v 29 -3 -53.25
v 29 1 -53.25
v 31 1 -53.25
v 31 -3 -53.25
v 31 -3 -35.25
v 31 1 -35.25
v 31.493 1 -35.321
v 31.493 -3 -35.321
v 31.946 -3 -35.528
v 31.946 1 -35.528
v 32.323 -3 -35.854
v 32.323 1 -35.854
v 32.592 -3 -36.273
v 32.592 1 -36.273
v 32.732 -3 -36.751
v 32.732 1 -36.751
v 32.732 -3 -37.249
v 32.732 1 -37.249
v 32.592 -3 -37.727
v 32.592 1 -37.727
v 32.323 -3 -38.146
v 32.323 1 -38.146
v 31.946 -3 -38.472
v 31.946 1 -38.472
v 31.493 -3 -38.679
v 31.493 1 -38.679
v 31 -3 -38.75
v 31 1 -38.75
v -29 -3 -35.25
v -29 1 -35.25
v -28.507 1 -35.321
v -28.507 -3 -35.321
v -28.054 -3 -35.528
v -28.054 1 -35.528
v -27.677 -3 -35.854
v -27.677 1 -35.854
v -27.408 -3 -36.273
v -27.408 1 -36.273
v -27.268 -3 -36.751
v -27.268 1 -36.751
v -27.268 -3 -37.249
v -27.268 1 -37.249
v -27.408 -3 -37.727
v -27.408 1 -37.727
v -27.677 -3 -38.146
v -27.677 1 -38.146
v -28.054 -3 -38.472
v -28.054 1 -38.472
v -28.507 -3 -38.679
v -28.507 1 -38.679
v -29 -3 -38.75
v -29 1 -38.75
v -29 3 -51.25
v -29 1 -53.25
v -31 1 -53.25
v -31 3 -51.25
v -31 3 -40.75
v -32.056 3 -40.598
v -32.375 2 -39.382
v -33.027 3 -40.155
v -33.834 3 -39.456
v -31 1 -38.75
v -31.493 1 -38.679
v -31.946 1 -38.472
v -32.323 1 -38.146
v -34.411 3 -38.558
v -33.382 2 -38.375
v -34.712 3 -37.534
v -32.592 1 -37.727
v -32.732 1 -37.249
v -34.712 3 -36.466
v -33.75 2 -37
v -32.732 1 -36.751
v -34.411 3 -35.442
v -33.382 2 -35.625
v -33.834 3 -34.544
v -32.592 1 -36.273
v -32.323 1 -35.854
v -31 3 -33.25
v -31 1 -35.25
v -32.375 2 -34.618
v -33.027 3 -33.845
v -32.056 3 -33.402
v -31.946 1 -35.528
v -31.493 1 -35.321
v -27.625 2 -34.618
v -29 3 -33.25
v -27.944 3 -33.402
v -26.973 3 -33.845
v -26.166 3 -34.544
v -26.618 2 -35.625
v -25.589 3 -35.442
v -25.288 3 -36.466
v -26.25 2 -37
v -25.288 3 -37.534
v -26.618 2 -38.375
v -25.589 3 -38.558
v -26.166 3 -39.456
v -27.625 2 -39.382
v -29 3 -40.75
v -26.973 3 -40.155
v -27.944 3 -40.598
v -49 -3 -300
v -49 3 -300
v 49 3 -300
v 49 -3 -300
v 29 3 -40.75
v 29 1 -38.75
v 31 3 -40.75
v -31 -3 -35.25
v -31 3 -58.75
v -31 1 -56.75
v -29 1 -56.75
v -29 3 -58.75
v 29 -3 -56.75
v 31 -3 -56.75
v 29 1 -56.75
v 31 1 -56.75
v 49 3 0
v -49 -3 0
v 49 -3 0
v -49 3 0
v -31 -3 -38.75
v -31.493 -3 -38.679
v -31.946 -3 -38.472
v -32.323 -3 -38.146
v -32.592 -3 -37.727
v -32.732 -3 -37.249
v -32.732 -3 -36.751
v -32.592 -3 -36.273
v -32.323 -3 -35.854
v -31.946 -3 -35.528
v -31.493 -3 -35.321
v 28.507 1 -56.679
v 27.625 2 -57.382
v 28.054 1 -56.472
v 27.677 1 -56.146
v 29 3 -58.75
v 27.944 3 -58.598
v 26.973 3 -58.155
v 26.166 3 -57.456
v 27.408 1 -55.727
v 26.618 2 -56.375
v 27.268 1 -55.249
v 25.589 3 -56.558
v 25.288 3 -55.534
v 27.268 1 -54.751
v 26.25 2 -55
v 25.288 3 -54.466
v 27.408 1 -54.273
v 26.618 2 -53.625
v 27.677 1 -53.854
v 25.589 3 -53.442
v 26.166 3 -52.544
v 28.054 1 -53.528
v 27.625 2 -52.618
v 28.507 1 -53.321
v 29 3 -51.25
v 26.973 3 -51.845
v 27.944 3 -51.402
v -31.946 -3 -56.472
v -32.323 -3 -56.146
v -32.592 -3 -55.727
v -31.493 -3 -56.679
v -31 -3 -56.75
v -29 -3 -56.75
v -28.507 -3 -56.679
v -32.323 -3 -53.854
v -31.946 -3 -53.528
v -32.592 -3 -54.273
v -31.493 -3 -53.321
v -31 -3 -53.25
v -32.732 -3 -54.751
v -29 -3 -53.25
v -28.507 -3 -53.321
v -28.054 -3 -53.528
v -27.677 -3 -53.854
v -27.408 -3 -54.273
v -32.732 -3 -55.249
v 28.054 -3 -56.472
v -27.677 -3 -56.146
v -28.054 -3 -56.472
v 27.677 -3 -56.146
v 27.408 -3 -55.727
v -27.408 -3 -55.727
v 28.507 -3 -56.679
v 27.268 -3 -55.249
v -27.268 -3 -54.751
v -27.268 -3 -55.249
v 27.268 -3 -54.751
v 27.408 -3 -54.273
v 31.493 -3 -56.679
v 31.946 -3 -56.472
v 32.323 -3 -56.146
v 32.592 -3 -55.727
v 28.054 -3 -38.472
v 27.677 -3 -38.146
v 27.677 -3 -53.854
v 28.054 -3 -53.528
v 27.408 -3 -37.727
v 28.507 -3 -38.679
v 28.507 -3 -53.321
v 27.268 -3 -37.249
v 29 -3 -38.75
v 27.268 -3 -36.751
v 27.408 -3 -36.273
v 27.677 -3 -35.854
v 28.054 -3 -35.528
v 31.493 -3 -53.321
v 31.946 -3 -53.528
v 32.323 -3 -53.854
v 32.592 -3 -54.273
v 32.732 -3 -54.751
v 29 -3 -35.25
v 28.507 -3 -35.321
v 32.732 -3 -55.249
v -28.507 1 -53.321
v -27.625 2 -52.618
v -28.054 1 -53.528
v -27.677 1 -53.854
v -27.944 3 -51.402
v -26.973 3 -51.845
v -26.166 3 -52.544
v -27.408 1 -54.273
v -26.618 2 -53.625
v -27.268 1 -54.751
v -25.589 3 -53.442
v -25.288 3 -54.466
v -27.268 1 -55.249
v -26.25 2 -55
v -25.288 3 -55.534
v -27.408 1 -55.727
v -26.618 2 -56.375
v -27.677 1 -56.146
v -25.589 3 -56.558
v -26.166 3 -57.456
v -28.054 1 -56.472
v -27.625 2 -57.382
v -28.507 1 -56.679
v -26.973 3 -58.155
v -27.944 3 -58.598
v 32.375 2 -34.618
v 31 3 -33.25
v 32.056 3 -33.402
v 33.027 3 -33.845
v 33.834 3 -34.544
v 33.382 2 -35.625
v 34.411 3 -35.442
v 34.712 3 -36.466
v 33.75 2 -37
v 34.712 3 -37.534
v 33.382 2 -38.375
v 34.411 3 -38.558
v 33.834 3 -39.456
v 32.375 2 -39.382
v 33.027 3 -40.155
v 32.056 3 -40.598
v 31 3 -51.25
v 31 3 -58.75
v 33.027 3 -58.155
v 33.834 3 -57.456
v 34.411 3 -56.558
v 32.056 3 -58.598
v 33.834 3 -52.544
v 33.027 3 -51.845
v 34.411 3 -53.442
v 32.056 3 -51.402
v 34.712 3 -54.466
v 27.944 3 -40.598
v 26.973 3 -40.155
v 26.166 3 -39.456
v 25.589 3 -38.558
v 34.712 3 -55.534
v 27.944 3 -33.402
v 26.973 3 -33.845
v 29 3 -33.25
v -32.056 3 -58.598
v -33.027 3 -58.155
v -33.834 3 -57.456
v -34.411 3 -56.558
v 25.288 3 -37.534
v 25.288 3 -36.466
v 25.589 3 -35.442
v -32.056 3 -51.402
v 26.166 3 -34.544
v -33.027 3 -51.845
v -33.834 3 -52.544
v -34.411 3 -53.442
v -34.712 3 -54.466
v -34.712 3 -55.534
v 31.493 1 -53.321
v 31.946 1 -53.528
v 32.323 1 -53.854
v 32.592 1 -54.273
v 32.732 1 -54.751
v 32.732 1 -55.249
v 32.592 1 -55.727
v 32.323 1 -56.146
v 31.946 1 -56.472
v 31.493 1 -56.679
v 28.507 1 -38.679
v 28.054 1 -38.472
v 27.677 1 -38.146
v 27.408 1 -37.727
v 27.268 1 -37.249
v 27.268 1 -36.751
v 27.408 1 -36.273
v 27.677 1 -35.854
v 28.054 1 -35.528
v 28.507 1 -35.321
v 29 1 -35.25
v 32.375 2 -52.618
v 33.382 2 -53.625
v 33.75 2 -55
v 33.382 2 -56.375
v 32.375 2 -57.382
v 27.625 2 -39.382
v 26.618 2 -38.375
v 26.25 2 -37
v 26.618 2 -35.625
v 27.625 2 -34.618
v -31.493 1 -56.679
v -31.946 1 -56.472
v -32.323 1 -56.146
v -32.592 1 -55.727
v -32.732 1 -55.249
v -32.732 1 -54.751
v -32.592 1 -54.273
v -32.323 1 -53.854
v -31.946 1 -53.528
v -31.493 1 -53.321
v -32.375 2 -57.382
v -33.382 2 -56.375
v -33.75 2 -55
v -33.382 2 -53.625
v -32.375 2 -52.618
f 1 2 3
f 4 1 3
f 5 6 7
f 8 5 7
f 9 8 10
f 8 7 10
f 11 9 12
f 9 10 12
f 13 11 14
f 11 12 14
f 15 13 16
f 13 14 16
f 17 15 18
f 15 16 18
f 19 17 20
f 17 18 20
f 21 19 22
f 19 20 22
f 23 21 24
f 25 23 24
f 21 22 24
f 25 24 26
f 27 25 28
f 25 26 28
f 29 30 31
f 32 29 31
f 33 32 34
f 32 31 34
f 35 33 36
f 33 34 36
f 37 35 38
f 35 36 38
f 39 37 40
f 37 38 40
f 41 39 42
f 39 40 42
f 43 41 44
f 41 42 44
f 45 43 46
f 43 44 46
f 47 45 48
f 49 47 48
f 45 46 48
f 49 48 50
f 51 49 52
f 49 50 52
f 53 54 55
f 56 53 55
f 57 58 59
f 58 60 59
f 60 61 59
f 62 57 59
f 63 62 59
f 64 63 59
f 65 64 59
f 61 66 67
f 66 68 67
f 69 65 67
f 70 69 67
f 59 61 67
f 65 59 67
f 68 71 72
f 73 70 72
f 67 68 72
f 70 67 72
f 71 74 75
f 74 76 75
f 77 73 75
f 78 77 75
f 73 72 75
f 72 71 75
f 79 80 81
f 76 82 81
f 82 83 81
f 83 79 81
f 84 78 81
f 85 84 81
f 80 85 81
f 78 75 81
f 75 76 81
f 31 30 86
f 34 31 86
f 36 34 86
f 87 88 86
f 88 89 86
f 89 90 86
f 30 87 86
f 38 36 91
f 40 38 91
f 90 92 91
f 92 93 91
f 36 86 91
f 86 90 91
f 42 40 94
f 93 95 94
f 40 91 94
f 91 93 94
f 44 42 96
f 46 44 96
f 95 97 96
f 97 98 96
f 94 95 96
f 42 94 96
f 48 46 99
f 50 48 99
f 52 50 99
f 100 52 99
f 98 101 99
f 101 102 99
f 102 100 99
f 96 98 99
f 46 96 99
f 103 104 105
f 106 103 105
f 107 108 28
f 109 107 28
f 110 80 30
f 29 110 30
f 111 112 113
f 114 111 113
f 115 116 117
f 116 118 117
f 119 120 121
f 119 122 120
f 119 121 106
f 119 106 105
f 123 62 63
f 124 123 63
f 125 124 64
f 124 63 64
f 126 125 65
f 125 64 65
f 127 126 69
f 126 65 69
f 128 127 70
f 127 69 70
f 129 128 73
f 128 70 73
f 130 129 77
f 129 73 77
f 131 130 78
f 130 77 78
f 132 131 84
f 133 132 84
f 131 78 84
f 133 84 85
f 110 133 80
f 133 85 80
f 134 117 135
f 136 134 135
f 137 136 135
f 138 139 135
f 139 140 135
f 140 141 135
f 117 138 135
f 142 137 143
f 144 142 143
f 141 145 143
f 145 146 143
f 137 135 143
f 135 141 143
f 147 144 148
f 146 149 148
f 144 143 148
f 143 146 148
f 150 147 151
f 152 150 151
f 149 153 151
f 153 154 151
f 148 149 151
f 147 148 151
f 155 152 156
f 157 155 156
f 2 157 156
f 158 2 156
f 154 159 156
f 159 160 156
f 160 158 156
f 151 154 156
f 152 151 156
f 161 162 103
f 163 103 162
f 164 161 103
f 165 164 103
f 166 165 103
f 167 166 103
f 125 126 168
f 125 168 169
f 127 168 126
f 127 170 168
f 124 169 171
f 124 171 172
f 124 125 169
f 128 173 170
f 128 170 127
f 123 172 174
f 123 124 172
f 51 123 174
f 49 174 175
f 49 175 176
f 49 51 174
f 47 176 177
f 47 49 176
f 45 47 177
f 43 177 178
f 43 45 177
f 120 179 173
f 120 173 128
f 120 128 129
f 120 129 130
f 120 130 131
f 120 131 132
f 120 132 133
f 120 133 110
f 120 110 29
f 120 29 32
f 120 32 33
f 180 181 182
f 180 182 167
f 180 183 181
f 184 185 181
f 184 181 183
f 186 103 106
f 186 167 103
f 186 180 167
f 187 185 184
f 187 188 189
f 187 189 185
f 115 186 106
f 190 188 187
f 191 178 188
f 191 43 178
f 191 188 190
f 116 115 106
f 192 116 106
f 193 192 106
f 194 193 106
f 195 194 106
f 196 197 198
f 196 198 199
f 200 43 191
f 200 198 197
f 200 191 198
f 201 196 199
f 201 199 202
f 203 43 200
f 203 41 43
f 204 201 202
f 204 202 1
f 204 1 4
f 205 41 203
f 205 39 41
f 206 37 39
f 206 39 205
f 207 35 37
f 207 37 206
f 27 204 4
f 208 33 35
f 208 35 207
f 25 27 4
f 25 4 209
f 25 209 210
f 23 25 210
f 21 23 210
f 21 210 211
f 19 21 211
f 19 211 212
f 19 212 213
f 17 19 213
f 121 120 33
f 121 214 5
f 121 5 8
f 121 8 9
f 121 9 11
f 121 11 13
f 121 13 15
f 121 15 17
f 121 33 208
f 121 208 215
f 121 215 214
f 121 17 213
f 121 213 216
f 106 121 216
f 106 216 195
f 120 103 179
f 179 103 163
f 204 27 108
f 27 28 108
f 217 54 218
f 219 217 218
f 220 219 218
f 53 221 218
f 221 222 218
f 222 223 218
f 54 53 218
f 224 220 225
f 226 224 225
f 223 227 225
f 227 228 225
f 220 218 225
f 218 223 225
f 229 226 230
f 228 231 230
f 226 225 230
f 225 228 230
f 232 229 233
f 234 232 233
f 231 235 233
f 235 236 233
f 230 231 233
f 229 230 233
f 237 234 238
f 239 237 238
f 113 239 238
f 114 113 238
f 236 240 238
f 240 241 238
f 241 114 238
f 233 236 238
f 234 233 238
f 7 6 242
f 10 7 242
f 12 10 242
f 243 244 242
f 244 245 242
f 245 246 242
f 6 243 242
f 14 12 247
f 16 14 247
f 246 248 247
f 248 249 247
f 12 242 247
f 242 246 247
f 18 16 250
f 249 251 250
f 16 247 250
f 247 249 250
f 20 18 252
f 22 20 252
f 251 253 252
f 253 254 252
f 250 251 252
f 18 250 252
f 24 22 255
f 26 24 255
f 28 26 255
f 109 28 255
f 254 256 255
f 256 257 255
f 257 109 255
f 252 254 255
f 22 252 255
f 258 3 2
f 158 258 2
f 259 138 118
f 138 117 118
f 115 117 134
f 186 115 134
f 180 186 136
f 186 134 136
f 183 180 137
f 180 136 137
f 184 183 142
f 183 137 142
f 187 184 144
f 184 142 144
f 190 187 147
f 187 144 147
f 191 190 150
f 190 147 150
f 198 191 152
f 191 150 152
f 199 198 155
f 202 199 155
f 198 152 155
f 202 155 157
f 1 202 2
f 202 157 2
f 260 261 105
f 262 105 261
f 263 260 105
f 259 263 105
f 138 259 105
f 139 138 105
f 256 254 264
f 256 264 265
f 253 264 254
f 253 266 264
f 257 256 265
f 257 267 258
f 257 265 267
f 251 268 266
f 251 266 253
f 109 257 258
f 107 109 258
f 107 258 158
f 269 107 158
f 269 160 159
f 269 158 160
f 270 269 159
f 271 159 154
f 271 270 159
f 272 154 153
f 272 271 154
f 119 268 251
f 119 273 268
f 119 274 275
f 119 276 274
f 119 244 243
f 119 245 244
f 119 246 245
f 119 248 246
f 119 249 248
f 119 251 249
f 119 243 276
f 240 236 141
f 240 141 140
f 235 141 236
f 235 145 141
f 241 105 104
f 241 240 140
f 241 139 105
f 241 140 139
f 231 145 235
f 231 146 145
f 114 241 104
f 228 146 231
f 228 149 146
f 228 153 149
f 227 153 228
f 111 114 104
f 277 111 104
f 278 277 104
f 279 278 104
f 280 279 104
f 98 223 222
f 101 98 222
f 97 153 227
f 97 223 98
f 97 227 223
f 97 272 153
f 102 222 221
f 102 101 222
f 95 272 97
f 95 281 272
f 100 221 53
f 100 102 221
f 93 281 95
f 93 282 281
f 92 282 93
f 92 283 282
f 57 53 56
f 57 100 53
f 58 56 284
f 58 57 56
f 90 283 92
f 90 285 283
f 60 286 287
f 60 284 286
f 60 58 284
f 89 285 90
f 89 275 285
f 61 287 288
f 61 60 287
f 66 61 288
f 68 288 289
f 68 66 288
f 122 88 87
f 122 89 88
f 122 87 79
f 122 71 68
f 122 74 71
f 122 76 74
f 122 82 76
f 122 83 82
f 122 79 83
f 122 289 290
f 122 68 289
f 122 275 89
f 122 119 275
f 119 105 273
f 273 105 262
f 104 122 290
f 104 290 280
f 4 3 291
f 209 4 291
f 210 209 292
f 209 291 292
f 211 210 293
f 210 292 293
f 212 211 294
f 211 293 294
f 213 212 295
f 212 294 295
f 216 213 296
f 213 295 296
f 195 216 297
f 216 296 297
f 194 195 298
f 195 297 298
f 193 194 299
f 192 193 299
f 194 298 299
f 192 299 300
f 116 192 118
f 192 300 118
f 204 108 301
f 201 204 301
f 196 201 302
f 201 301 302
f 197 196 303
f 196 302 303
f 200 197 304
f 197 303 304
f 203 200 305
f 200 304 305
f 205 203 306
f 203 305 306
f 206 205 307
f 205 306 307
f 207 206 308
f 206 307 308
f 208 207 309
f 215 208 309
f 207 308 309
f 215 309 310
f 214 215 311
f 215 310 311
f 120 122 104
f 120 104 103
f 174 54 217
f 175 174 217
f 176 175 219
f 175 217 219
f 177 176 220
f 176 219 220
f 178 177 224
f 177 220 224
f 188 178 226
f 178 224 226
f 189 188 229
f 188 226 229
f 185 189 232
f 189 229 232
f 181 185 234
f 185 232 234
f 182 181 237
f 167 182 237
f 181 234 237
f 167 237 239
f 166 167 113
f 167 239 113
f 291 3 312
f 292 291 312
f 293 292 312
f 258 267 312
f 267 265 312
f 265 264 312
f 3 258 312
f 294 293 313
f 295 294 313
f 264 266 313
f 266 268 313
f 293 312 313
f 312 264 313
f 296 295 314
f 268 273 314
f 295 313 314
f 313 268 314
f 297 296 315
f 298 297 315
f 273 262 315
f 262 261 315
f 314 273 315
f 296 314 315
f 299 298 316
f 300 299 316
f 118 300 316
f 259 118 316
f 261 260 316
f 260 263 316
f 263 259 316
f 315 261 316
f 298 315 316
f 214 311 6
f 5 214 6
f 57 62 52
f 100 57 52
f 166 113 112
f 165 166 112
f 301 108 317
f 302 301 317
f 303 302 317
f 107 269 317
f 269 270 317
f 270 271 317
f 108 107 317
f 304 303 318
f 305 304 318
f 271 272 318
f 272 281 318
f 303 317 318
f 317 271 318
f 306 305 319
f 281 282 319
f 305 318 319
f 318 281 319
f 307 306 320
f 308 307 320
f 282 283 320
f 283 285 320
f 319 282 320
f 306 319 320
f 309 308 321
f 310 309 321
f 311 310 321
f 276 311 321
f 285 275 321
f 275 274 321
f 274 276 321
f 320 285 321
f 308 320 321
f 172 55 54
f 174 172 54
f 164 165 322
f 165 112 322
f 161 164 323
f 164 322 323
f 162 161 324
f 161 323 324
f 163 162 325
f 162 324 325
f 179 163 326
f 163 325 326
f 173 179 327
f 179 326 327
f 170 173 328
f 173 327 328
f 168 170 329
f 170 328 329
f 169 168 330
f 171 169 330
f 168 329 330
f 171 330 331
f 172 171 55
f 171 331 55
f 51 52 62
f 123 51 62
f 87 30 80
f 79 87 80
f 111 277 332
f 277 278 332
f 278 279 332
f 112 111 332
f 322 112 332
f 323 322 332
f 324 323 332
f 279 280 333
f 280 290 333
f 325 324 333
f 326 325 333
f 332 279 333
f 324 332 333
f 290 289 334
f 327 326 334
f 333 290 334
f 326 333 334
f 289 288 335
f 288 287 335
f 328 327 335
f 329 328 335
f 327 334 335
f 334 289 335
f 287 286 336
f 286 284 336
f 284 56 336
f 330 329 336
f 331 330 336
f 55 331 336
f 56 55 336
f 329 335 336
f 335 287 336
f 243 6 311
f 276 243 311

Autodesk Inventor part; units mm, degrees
ref_plane "YZ Plane" through (0, 0, 0) normal (1, 0, 0) x (0, 1, 0)
ref_plane "XZ Plane" through (0, 0, 0) normal (0, 1, 0) x (-1, 0, 0)
ref_plane "XY Plane" through (0, 0, 0) normal (0, 0, 1) x (1, 0, 0)
sketch "Skizze1" plane through (0, 0, 0) normal (0, 0, 1) x (1, 0, 0)
  line L0 (-68.6, 0) -> (68.6, 0) projected
  line L1 (0, -4.2) -> (0, 4.2) projected
  line L2 (-49, -3) -> (49, -3)
  line L3 (49, -3) -> (49, 3)
  line L4 (49, 3) -> (-49, 3)
  line L5 (-49, 3) -> (-49, -3)
  line L6 (-49, -3) -> (49, 3) construction
  line L7 (49, -3) -> (-49, 3) construction
  point P0 (0, 0)
  dimension "d0" = 98
  dimension "d1" = 6
extrude "Extrusion1" add sketch "Skizze1" against normal blind 300
sketch "Skizze2" plane through (-49, 3, 0) normal (0, 1, 0) x (1, 0, 0)
  line L0 (-19.6, 0) -> (117.6, 0) projected
  line L1 (49, 360) -> (49, -60) projected
  line L2 (98, 0) -> (0, 0) projected
  line L3 (98, 0) -> (98, 300) projected
  line L4 (0, 300) -> (98, 300) projected
  line L5 (0, 0) -> (0, 300) projected
  line L6 (18, 37) -> (20, 37) construction
  line L7 (18, 35.25) -> (20, 35.25)
  line L8 (20, 38.75) -> (18, 38.75)
  arc A0 (18, 38.75) -> (18, 35.25) centre (18, 37) ccw
  arc A1 (20, 35.25) -> (20, 38.75) centre (20, 37) ccw
  arc A2 (20, 53.25) -> (20, 56.75) centre (20, 55) ccw
  line L9 (18, 53.25) -> (20, 53.25)
  arc A3 (18, 56.75) -> (18, 53.25) centre (18, 55) ccw
  line L10 (20, 56.75) -> (18, 56.75)
  arc A4 (80, 35.25) -> (80, 38.75) centre (80, 37) ccw
  line L11 (78, 35.25) -> (80, 35.25)
  arc A5 (78, 38.75) -> (78, 35.25) centre (78, 37) ccw
  line L12 (80, 38.75) -> (78, 38.75)
  arc A6 (80, 53.25) -> (80, 56.75) centre (80, 55) ccw
  line L13 (78, 53.25) -> (80, 53.25)
  arc A7 (78, 56.75) -> (78, 53.25) centre (78, 55) ccw
  line L14 (80, 56.75) -> (78, 56.75)
  point P0 (49, 0)
  point P1 (19, 37)
  dimension "d4" = 2
  dimension "d5" = 3.5
  dimension "d8" = 18
  dimension "d11" = 60
  dimension "d14" = 37
extrude "Extrusion2" cut sketch "Skizze2" against normal blind 300 contours A0 L8 A1 L7 | L9 A3 L10 A2 | L11 A5 L12 A4 | L13 A7 L14 A6
chamfer "Fase1" distance 2 angle 45 16 edges at (-27.25, 3, -37) (-30, 3, -35.25) (-32.75, 3, -37) (-30, 3, -38.75) (-27.25, 3, -55) (-30, 3, -53.25) (-32.75, 3, -55) (-30, 3, -56.75) (30, 3, -35.25) (27.25, 3, -37) (30, 3, -38.75) (32.75, 3, -37) (32.75, 3, -55) (30, 3, -53.25) (27.25, 3, -55) (30, 3, -56.75)
properties part number "I Türe" material "PVC, hart"
